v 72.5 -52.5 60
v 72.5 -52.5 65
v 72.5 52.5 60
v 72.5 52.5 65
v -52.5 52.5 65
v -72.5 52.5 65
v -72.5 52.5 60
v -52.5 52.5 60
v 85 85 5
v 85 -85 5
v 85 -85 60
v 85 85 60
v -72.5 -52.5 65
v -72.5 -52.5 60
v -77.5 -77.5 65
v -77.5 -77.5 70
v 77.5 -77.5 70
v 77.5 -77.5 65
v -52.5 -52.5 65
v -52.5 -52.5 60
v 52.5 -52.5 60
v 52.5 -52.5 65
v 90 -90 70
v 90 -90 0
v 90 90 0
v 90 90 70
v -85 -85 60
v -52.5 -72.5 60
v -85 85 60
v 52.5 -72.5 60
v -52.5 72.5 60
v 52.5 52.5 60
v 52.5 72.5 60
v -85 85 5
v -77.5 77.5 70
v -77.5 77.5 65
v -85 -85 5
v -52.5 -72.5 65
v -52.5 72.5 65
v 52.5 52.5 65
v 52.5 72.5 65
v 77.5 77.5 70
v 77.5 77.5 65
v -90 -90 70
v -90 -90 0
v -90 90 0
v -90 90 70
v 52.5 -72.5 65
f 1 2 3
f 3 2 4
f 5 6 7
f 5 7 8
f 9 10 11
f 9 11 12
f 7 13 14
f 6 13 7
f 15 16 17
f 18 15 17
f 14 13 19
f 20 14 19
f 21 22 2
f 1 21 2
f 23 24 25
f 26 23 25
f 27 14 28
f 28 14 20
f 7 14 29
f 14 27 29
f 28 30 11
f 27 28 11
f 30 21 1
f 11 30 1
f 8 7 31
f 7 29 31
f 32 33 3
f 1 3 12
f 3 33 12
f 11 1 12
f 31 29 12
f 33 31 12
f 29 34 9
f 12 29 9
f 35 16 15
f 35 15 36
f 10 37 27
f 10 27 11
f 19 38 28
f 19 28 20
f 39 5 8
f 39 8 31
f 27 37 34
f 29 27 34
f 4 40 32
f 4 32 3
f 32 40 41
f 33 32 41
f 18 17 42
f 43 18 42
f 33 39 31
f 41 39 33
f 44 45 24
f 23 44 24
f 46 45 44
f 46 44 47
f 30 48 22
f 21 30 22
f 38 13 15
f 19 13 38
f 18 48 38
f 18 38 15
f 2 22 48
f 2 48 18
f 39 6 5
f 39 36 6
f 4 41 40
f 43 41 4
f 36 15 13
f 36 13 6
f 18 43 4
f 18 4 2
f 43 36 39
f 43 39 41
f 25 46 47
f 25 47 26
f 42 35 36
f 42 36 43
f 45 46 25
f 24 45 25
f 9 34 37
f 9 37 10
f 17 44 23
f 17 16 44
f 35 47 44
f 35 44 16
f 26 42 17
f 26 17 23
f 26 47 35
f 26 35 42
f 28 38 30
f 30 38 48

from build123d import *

# Parameters (mm, degrees)
F0_W      = 180
F0_H      = 180
F1_DEPTH  = 70
F2_T      = -5
F3_W      = 170
F3_H      = 170
F4_DEPTH  = 10
F5_W      = 155
F5_H      = 155
F6_DEPTH  = 5
F7_W      = 145
F7_H      = 145
F8_DEPTH  = 25
F9_W      = 20
F9_H      = 20
F10_DEPTH = 5


with BuildPart() as f1:
    # F0 (on Top) → F1 (new body)
    with BuildSketch(Plane.XY):
        Rectangle(F0_W, F0_H)
    extrude(amount=F1_DEPTH)

    # F2
    f2_openings = [f1.faces().sort_by_distance(p)[0] for p in [
        (0, 0, 70),
    ]]
    offset(amount=F2_T, openings=f2_openings)

    # F3 (on face) → F4 (join)
    with BuildSketch(Plane.XY.offset(70)):
        Rectangle(F3_W, F3_H)
    extrude(amount=-F4_DEPTH)

    # F5 (on face) → F6 (cut)
    with BuildSketch(Plane.XY.offset(70)):
        Rectangle(F5_W, F5_H)
    extrude(amount=-F6_DEPTH, mode=Mode.SUBTRACT)

    # F7 (on face) → F8 (cut)
    with BuildSketch(Plane.XY.offset(65)):
        Rectangle(F7_W, F7_H)
    extrude(amount=-F8_DEPTH, mode=Mode.SUBTRACT)

    # F9 (on face) → F10 (join)
    with BuildSketch(Plane.XY.offset(65)):
        with Locations((-62.5, 62.5)):
            Rectangle(F9_W, F9_H)
        with Locations((62.5, 62.5)):
            Rectangle(F9_W, F9_H)
        with Locations((62.5, -62.5)):
            Rectangle(F9_W, F9_H)
        with Locations((-62.5, -62.5)):
            Rectangle(F9_W, F9_H)
    extrude(amount=-F10_DEPTH)


solid = f1.part
